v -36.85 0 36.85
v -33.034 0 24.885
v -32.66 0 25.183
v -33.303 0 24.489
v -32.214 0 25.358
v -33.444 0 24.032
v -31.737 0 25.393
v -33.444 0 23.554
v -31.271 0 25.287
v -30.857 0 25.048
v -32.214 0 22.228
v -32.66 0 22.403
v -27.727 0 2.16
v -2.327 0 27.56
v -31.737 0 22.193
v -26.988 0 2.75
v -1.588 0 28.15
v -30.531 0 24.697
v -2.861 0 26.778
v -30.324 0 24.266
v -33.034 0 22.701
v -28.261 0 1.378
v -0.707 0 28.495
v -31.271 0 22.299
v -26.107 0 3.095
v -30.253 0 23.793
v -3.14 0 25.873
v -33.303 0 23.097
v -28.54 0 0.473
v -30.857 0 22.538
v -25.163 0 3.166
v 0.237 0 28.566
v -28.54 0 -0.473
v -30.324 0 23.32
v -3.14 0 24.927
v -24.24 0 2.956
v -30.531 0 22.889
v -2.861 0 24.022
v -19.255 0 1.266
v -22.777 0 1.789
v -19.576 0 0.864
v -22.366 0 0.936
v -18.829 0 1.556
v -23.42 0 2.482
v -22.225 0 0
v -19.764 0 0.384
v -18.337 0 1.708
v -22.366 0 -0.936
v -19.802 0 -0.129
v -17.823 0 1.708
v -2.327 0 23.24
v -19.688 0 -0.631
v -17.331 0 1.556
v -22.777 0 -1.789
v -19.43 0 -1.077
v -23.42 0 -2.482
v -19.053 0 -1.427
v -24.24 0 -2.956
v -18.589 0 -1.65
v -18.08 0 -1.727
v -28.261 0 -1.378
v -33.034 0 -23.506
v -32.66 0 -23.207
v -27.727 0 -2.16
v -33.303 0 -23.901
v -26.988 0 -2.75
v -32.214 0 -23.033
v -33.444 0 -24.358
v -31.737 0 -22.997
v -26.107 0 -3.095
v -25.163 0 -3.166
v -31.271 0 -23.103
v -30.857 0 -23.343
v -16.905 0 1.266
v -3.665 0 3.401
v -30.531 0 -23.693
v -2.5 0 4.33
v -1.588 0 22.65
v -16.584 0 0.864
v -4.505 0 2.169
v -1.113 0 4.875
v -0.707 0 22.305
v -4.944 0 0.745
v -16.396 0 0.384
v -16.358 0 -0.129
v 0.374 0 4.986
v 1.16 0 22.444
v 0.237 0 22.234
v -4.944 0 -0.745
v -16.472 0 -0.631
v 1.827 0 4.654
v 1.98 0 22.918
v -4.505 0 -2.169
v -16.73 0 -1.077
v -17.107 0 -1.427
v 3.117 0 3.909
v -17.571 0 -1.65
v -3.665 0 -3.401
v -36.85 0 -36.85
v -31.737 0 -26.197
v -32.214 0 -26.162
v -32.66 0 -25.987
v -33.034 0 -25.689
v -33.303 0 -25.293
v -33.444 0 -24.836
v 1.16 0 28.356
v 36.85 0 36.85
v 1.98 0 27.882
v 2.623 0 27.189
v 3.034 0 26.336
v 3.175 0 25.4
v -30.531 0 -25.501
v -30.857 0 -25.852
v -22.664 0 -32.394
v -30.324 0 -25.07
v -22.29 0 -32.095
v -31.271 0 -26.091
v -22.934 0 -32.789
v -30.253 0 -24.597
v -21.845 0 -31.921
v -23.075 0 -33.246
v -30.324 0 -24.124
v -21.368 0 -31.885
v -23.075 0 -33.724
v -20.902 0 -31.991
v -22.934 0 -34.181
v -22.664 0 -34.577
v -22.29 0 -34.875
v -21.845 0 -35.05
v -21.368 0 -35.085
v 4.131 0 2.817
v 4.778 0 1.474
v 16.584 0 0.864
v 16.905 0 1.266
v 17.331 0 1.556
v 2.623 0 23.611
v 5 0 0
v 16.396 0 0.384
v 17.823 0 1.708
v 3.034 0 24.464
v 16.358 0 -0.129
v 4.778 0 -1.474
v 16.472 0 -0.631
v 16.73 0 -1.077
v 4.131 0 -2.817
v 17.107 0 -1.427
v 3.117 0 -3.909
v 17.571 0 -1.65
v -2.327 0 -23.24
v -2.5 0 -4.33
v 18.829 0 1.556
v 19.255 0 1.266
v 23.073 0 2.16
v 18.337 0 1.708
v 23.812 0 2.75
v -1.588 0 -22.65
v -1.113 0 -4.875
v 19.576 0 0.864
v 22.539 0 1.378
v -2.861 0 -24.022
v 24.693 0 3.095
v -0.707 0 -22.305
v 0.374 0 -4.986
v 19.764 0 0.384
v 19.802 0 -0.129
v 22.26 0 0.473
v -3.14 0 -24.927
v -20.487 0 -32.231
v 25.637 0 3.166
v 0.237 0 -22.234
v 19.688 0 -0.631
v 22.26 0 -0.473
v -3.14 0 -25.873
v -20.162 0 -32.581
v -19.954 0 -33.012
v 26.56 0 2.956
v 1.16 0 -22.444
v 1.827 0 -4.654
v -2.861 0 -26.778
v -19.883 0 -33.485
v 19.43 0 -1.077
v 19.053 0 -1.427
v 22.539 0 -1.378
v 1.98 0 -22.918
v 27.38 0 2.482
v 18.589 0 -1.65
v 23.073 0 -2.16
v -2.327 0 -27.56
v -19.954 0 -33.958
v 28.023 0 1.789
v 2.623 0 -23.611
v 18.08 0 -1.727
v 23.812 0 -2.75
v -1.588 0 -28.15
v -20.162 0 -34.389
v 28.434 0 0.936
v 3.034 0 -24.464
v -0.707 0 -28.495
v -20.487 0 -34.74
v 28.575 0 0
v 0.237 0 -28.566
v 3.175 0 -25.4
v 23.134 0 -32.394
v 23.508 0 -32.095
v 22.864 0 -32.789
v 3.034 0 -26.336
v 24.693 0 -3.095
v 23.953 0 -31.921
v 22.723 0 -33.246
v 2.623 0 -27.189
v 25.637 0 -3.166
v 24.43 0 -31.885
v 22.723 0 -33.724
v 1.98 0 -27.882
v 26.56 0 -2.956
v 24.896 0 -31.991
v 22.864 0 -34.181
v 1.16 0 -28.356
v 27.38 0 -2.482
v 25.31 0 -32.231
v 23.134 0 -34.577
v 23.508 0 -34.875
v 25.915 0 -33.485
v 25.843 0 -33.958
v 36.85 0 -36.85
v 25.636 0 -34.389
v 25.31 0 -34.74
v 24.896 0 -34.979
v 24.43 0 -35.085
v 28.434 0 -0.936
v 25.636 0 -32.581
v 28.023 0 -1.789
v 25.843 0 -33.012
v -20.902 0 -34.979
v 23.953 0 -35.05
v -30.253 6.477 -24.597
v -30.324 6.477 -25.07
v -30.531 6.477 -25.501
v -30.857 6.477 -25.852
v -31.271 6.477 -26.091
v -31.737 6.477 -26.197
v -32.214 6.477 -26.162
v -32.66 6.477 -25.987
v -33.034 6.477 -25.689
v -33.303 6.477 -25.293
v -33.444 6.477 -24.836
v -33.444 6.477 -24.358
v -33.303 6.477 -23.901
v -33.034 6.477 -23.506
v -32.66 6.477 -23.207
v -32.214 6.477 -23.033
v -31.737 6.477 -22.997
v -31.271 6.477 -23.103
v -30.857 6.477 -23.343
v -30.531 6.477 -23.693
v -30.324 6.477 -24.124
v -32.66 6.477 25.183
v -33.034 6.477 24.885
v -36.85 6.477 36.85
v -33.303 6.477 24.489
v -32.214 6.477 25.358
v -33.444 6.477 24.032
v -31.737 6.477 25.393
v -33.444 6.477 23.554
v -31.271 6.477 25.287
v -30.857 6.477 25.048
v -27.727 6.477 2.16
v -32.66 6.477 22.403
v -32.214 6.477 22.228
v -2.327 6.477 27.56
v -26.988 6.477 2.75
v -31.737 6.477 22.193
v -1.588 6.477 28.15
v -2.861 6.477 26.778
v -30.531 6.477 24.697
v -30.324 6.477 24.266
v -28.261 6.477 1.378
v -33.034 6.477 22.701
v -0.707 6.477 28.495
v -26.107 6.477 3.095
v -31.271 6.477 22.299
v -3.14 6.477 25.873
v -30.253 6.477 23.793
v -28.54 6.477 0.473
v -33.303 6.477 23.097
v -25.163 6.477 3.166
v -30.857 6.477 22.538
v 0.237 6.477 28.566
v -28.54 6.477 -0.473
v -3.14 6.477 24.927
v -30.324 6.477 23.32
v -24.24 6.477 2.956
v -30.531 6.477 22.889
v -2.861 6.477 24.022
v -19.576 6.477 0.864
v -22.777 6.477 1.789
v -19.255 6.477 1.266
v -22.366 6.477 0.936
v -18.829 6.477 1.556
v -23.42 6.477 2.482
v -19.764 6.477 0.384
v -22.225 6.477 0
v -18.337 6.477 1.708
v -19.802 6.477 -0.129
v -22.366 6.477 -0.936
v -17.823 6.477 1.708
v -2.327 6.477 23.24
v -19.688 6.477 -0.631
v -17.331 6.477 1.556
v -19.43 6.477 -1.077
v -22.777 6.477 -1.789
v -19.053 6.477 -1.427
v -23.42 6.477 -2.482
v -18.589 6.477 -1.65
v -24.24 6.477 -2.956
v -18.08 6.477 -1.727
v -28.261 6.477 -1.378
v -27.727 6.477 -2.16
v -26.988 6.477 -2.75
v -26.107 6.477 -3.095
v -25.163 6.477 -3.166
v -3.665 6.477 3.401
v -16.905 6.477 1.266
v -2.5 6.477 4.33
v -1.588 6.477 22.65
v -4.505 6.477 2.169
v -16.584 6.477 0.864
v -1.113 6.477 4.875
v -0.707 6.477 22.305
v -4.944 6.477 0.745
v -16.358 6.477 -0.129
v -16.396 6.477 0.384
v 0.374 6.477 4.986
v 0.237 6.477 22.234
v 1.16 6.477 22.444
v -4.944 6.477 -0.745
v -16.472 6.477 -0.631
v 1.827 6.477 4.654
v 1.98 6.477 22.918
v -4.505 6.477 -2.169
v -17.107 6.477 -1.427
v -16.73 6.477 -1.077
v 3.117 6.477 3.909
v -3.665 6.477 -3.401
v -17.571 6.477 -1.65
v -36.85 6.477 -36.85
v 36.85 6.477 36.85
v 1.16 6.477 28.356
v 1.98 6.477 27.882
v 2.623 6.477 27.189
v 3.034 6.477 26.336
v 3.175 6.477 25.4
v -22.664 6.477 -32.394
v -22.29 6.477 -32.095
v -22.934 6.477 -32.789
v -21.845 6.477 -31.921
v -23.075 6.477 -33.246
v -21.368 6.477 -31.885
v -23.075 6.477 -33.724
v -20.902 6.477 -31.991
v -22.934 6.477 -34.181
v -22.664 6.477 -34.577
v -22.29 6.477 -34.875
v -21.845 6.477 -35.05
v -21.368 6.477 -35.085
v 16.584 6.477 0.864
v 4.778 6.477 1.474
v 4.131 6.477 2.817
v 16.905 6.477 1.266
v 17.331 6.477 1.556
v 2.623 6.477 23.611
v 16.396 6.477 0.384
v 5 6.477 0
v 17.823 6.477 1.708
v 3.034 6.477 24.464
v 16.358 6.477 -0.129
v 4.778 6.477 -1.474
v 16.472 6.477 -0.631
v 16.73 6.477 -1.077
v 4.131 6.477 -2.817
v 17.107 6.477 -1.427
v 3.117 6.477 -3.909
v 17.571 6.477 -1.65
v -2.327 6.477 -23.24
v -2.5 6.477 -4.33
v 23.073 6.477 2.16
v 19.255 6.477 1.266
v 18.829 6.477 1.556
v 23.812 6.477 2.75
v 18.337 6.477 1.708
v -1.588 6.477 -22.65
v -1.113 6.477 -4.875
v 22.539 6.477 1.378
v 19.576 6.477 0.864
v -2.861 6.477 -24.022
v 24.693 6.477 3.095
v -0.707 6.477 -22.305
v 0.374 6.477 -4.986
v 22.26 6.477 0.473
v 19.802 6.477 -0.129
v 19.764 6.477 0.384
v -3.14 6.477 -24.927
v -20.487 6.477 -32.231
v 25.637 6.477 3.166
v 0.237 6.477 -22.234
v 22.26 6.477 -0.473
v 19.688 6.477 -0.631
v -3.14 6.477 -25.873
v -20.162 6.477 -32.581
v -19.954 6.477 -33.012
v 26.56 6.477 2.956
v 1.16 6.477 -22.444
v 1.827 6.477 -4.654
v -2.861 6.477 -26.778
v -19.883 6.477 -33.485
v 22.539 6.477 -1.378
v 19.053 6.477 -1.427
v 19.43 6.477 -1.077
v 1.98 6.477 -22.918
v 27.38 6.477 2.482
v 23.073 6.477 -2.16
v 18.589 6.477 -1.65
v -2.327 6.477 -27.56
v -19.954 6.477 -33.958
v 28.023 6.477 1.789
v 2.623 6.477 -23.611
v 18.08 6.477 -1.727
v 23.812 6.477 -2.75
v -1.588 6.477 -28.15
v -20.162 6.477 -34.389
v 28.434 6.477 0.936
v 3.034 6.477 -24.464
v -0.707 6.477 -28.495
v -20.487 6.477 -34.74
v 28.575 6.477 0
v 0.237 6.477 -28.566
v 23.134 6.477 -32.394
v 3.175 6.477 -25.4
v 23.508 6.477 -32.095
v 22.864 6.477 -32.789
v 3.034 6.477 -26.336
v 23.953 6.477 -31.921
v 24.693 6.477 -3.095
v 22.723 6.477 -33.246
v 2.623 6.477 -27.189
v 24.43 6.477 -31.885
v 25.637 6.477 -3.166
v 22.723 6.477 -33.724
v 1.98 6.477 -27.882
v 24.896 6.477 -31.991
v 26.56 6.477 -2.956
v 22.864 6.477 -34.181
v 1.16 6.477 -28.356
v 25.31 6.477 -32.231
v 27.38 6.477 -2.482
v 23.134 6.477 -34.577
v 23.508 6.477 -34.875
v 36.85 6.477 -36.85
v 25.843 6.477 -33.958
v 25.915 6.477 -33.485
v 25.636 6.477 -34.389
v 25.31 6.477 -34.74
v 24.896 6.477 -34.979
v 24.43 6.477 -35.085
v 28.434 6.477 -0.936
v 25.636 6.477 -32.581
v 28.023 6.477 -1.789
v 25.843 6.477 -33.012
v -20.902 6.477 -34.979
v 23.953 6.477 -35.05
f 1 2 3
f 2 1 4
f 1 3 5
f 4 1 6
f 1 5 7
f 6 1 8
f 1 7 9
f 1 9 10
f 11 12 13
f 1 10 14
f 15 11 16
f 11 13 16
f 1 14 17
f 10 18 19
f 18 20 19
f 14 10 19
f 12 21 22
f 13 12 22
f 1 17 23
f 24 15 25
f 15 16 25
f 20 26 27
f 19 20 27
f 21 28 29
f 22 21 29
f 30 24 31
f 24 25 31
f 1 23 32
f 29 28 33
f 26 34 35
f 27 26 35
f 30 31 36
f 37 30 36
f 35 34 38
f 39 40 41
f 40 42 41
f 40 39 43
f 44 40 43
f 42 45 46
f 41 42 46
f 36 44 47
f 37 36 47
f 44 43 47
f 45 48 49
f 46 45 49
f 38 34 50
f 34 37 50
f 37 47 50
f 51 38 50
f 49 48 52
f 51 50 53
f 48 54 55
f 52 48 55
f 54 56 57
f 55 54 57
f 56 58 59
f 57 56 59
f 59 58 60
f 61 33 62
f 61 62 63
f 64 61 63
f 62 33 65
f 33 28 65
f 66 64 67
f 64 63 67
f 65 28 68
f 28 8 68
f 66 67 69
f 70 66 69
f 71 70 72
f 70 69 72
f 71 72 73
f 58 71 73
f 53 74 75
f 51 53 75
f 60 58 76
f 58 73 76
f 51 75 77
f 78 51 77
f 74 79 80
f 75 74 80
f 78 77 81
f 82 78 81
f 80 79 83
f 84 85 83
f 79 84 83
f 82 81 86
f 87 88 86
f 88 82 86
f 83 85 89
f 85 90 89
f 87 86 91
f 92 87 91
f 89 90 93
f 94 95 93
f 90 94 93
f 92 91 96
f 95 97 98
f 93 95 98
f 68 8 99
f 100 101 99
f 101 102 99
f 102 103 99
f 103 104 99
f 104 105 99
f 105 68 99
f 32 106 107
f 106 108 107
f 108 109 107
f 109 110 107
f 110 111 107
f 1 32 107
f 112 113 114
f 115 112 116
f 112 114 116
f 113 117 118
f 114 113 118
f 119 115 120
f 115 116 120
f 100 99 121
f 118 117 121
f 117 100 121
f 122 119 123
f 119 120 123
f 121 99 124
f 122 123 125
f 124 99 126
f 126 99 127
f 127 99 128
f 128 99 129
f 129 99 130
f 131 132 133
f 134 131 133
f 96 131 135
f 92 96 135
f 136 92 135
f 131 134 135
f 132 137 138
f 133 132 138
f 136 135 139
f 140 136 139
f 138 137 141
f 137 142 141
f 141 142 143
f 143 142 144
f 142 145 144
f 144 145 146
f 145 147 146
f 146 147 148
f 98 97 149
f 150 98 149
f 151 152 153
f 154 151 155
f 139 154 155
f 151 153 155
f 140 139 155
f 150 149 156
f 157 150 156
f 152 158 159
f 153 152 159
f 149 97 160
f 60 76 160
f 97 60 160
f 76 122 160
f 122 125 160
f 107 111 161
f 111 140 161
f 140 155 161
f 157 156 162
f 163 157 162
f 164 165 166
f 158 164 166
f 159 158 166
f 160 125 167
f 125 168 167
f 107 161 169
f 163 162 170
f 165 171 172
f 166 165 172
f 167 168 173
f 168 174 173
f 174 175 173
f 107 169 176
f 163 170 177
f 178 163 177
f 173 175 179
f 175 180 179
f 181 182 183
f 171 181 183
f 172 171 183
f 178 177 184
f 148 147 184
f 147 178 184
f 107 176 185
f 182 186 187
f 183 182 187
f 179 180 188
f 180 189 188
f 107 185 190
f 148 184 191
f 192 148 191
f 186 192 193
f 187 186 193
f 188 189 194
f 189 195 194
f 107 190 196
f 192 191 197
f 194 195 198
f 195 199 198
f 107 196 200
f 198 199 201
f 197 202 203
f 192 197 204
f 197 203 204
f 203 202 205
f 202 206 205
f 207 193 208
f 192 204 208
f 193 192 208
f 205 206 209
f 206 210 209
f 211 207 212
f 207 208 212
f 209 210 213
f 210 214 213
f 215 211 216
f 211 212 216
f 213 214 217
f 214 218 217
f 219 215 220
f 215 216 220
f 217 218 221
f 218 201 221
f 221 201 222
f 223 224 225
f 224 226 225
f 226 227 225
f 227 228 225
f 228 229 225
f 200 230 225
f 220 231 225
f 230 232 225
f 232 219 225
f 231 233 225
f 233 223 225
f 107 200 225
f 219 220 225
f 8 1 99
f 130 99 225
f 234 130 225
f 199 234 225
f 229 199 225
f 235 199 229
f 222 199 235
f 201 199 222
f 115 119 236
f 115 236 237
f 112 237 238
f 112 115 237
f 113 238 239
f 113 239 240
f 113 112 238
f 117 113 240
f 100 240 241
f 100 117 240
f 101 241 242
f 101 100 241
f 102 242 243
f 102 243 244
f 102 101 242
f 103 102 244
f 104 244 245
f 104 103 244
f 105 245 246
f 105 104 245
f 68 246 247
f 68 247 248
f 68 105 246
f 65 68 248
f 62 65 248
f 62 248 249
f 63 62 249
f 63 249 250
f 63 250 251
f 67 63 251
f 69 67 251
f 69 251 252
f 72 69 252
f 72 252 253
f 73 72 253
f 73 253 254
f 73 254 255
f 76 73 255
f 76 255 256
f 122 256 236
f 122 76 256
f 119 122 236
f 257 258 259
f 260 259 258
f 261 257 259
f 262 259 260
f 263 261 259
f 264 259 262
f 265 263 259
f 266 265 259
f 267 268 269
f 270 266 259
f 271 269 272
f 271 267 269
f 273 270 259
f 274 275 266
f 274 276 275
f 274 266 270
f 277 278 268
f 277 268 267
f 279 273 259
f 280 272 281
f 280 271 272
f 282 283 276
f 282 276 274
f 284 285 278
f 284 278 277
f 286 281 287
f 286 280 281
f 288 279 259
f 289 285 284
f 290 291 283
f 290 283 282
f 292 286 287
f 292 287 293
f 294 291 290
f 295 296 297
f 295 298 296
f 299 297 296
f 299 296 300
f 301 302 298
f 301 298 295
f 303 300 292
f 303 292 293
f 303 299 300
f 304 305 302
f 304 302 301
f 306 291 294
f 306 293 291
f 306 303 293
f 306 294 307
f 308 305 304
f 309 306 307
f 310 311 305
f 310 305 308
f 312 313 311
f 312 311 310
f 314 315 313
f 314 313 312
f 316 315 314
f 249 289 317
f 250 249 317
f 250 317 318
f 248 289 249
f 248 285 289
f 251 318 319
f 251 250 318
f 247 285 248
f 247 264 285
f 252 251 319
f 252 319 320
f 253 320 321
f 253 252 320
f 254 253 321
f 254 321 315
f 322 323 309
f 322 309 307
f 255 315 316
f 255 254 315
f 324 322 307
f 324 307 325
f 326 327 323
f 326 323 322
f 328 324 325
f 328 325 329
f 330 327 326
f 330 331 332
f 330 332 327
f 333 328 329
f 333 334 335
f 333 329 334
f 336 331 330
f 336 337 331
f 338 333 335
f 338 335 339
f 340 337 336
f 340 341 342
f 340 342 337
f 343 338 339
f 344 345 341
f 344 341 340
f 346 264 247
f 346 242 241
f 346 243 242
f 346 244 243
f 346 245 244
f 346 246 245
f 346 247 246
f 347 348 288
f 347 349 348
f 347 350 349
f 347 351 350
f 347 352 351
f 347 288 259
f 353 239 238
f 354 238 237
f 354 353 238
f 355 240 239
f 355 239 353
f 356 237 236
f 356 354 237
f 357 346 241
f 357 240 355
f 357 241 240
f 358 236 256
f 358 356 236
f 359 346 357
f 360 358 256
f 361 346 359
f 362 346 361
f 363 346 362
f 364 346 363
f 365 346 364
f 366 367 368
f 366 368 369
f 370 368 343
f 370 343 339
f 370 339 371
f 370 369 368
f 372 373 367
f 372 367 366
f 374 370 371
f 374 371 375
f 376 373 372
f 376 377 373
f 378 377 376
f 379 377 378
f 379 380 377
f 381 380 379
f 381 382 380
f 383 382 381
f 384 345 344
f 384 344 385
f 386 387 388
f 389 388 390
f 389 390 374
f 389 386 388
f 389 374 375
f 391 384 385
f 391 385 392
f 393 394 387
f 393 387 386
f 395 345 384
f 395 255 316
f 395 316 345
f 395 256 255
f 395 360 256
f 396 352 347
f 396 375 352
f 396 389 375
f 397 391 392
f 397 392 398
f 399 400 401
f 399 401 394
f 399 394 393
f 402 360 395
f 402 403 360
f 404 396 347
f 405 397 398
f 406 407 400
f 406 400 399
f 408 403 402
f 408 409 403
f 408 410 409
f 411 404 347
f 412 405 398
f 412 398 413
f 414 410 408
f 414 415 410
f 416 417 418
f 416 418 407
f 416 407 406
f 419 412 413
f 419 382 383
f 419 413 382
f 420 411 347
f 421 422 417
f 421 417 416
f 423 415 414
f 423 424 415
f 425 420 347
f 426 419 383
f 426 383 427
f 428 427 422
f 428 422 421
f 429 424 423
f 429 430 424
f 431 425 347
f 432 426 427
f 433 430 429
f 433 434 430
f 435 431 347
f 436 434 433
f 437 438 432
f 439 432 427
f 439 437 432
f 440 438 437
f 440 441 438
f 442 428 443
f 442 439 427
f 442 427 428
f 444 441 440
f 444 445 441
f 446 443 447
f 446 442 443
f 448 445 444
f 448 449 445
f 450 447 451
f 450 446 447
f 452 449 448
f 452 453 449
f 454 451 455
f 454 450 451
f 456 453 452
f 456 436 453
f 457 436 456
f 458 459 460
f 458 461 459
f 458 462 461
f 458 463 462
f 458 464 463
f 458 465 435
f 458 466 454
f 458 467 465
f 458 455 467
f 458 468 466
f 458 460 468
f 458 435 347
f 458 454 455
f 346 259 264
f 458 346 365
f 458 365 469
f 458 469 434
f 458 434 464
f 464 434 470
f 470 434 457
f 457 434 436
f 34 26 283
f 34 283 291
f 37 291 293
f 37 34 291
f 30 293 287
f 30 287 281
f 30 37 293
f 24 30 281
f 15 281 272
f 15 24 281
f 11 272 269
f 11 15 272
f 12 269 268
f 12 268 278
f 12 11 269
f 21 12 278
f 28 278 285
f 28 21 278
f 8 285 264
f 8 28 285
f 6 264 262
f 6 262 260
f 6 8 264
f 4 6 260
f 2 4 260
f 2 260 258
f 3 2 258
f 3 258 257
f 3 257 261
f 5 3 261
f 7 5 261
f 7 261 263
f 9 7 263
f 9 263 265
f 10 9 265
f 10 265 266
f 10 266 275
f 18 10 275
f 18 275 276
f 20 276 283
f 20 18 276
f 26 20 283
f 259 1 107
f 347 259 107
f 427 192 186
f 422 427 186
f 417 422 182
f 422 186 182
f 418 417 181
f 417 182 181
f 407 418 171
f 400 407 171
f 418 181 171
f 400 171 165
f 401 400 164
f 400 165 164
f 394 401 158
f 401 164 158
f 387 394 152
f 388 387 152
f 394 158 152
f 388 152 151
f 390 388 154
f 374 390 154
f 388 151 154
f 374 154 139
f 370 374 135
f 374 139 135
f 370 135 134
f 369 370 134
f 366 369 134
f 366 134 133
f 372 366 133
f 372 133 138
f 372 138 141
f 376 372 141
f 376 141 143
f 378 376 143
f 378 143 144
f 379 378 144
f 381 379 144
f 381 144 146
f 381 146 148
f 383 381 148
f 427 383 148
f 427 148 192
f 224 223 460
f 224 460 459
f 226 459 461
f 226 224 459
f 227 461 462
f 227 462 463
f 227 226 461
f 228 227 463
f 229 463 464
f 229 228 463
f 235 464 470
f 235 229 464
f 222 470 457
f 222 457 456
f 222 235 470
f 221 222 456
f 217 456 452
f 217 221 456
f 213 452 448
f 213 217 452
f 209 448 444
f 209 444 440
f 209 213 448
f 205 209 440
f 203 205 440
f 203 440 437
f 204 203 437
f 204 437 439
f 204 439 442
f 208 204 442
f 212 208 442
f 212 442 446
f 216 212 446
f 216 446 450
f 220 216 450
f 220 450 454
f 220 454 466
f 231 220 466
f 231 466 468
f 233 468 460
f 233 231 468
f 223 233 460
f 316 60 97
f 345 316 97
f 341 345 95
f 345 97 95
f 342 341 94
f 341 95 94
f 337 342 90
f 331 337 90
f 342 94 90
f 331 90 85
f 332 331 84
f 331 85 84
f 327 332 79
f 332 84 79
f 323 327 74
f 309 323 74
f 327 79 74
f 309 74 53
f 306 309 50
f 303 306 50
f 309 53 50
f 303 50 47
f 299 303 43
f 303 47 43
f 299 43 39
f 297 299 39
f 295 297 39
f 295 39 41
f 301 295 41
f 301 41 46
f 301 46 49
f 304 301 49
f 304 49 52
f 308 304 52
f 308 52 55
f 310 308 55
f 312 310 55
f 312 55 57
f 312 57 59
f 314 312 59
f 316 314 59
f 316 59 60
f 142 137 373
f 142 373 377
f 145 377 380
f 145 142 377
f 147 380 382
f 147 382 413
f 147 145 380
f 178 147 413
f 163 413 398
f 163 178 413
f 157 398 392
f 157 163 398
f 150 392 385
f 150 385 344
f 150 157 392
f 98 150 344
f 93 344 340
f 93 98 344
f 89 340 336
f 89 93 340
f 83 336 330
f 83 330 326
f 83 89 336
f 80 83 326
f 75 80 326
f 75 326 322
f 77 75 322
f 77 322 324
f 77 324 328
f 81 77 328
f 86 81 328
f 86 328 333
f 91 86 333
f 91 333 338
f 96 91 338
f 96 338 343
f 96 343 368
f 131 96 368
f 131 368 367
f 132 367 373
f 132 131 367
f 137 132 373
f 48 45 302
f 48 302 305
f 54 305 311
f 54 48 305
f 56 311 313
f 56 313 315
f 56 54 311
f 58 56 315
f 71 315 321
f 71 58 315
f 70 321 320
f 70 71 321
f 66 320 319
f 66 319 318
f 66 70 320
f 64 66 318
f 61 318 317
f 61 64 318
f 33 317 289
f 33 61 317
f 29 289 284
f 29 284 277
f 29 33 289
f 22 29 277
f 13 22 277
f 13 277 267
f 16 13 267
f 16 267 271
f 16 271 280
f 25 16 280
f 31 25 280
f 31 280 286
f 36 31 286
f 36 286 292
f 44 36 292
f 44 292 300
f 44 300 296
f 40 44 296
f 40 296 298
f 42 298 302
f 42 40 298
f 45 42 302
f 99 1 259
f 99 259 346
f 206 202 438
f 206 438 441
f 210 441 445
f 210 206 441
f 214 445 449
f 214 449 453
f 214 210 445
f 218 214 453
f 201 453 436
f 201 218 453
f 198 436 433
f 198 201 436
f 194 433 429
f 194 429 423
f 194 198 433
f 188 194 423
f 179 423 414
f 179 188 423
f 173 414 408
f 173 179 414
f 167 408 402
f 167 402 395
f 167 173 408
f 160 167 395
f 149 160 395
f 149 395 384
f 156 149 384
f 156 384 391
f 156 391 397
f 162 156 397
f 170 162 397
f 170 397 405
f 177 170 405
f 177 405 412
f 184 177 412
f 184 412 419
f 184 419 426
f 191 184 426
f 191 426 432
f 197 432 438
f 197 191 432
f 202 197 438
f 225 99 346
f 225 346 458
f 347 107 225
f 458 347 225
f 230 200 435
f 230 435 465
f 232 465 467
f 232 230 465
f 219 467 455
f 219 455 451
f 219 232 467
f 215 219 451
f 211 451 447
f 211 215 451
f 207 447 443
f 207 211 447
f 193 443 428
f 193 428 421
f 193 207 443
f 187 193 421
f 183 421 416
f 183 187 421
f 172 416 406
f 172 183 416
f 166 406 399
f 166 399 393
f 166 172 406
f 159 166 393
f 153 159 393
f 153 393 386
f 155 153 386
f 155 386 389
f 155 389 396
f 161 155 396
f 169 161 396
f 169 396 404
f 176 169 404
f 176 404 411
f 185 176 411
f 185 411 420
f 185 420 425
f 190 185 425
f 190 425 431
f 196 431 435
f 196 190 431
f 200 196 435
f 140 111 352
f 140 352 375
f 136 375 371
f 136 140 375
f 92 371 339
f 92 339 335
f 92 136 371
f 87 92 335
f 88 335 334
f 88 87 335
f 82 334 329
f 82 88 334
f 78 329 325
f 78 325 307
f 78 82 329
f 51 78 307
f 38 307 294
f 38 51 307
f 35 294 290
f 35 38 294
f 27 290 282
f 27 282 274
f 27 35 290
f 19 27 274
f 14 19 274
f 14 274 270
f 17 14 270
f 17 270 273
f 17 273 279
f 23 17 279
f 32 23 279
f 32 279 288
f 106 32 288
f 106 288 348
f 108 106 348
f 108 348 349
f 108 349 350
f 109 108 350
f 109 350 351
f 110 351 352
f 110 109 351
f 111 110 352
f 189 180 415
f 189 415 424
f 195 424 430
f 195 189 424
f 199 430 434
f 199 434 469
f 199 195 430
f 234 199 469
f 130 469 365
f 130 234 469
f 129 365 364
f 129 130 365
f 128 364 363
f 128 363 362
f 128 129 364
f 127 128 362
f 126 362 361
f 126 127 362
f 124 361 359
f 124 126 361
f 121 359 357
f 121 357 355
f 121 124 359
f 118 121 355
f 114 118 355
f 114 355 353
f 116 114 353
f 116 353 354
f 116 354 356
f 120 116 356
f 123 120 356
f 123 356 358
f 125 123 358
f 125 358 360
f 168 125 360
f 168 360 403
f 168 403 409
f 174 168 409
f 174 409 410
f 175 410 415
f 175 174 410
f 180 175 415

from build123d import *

# Parameters (mm, degrees)
SKETCH1_W             = 73.7
SKETCH1_H             = 73.7
SKETCH1_R             = 3.175
SKETCH1_R_2           = 5
SKETCH1_R_3           = 1.604776926
OPTICAL_MOUNT_DEPTH   = 6.477
F_8_32_TAPPED_HOLE1_D = 3.4544


with BuildPart() as part:
    # Sketch1 → optical_mount (new body)
    with BuildSketch(Plane(origin=(0, 0, 0), x_dir=(1, 0, 0), z_dir=(0, 1, 0))):
        Rectangle(SKETCH1_W, SKETCH1_H)
        with Locations((0, 25.4)):
            Circle(SKETCH1_R, mode=Mode.SUBTRACT)
        with Locations((25.4, 0)):
            Circle(SKETCH1_R, mode=Mode.SUBTRACT)
        with Locations((0, -25.4)):
            Circle(SKETCH1_R, mode=Mode.SUBTRACT)
        with Locations((-25.4, 0)):
            Circle(SKETCH1_R, mode=Mode.SUBTRACT)
        Circle(SKETCH1_R_2, mode=Mode.SUBTRACT)
        with Locations((24.309899871, 33.48518084)):
            Circle(SKETCH1_R_3, mode=Mode.SUBTRACT)
        with Locations((-21.487964718, 33.48518084)):
            Circle(SKETCH1_R_3, mode=Mode.SUBTRACT)
        with Locations((-31.85729255, 24.597185555)):
            Circle(SKETCH1_R_3, mode=Mode.SUBTRACT)
        with Locations((-31.85729255, -23.793010992)):
            Circle(SKETCH1_R_3, mode=Mode.SUBTRACT)
    extrude(amount=OPTICAL_MOUNT_DEPTH)

    # #8-32 Tapped Hole1 (through all)
    with Locations(Plane(origin=(-18.08, 6.477, 0), x_dir=(0, 0, 1), z_dir=(0, 1, 0))):
        with Locations((0, 0), (0, 36.16)):
            Hole(F_8_32_TAPPED_HOLE1_D / 2)


solid = part.part
